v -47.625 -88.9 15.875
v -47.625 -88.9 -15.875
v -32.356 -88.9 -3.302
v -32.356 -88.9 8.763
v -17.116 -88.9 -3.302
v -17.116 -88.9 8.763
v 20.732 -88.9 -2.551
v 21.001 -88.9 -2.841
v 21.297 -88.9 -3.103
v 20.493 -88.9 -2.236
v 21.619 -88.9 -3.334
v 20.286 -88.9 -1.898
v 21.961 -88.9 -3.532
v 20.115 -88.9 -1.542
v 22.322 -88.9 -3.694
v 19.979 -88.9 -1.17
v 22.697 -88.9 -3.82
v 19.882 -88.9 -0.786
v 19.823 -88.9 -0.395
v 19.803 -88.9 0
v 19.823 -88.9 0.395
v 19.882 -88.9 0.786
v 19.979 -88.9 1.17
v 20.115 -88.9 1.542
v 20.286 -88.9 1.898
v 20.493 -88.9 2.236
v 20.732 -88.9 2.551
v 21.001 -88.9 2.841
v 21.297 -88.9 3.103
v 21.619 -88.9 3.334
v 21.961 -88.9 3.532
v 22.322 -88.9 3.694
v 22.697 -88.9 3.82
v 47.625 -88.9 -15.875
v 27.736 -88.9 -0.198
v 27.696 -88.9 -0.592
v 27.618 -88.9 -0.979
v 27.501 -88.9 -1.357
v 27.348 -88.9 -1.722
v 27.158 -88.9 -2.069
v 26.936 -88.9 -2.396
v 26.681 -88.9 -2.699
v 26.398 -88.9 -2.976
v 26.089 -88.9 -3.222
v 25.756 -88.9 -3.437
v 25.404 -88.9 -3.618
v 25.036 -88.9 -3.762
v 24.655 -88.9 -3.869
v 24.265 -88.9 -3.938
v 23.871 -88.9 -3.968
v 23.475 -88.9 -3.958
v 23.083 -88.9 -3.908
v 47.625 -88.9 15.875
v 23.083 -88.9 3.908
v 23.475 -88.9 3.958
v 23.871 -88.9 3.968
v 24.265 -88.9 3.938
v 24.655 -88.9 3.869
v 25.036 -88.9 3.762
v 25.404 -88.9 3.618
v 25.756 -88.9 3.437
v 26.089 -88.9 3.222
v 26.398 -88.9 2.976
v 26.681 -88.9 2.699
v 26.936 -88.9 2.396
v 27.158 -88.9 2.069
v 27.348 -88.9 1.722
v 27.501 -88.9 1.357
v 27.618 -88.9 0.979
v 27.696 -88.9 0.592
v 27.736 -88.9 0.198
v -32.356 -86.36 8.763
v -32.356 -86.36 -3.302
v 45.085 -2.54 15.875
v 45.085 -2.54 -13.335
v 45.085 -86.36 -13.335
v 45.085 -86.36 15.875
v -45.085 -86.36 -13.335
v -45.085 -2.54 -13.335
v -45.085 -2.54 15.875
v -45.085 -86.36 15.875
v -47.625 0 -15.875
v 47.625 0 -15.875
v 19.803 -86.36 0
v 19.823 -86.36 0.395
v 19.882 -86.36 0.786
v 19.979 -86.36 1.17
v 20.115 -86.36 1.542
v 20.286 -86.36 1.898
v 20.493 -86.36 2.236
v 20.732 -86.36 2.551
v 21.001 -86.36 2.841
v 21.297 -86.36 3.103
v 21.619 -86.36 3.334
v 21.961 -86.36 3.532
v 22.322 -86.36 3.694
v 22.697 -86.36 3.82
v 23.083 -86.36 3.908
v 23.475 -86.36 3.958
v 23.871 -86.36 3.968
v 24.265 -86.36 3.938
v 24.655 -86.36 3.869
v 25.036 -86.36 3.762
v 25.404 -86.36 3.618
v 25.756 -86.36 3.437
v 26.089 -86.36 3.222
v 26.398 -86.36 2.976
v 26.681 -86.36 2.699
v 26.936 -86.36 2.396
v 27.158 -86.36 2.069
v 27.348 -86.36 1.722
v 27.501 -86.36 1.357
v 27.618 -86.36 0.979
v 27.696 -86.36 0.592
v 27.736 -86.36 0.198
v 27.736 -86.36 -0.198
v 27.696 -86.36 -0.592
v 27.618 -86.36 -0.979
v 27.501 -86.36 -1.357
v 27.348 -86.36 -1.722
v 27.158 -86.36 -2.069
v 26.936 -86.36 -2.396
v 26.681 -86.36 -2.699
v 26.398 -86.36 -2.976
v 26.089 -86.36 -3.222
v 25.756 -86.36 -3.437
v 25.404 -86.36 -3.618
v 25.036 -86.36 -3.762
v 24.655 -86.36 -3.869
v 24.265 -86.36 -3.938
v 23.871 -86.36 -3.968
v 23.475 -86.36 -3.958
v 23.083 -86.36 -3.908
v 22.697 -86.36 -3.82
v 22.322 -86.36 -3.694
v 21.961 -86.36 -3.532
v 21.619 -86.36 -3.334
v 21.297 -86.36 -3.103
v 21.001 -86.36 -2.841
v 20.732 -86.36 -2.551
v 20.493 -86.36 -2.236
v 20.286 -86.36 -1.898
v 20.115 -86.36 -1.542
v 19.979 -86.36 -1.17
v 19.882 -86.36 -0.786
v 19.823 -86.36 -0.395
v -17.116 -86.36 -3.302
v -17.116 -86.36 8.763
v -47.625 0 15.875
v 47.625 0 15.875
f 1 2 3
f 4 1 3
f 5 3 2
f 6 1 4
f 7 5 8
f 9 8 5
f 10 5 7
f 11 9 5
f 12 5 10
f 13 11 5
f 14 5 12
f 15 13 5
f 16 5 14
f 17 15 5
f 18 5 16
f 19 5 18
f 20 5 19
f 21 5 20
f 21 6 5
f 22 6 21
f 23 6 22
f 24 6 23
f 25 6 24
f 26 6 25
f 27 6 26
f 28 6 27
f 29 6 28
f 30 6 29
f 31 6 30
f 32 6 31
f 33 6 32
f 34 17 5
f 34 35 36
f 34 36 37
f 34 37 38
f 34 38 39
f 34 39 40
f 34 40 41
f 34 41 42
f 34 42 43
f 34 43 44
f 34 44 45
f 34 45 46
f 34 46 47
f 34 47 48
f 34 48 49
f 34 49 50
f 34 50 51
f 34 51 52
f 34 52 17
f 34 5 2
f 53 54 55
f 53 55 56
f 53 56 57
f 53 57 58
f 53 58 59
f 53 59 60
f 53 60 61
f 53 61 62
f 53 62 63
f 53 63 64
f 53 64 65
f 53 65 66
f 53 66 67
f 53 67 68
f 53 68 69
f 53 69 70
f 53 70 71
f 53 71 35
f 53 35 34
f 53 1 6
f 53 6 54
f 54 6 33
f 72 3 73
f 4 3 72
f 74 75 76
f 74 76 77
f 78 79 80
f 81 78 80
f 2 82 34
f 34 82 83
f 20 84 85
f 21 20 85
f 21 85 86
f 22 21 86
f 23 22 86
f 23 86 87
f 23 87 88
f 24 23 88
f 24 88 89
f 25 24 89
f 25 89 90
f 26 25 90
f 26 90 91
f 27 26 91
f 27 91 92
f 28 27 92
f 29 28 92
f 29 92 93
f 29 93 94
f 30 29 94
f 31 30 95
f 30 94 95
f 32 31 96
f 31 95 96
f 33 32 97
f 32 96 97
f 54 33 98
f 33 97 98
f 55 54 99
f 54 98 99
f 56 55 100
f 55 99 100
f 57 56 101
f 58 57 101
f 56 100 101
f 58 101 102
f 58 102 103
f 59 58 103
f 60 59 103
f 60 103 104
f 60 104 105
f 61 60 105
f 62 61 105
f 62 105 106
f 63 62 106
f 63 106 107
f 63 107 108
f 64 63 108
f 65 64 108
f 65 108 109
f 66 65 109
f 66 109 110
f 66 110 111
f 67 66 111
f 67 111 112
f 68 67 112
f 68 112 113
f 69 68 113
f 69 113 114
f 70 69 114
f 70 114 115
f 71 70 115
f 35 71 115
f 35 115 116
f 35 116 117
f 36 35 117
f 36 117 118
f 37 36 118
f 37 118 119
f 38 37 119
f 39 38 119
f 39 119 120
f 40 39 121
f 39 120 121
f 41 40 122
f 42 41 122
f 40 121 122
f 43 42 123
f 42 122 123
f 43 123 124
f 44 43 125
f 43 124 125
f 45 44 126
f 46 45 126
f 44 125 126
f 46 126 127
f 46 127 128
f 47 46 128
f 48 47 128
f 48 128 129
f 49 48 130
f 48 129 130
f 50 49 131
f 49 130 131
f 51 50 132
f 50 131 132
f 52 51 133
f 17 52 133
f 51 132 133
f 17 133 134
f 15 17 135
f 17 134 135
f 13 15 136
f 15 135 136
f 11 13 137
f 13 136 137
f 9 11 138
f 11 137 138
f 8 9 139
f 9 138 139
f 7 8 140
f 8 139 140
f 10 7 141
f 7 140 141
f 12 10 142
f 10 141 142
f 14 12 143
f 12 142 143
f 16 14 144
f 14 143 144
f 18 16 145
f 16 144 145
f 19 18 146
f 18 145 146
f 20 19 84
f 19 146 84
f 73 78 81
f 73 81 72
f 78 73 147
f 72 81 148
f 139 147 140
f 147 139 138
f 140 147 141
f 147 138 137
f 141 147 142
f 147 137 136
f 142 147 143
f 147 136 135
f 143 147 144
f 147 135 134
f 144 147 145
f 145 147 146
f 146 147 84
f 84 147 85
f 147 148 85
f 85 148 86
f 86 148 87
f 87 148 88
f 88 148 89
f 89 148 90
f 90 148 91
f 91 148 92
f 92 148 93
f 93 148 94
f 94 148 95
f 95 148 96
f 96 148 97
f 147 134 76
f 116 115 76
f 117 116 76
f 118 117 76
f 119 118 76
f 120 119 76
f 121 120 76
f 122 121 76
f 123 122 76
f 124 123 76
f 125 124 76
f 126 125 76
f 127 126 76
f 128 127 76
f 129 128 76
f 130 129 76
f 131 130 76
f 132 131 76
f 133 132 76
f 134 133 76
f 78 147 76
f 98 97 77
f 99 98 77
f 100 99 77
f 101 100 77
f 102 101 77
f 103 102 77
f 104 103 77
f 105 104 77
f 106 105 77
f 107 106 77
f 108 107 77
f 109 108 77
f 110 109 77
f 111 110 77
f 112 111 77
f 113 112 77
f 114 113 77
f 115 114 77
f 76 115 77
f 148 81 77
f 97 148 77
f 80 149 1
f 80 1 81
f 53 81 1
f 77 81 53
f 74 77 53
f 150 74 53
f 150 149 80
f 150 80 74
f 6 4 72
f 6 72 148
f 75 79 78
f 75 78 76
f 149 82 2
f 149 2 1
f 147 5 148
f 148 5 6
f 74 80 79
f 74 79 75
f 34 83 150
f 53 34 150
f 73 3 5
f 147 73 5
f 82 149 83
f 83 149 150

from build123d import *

# Parameters (mm, degrees)
F0_W     = 95.25
F0_H     = 31.75
F1_DEPTH = 88.9
F2_T     = -2.54
F4_D     = 7.9375
F4_DEPTH = 12.7
F5_W     = 15.24
F5_H     = 12.065
F6_DEPTH = 2.54


with BuildPart() as f1:
    # F0 (on Front) → F1 (new body)
    with BuildSketch(Plane.XZ):
        Rectangle(F0_W, F0_H)
    extrude(amount=F1_DEPTH)

    # F2
    f2_openings = [f1.faces().sort_by_distance(p)[0] for p in [
        (0, -44.45, 15.875),
    ]]
    offset(amount=F2_T, openings=f2_openings)

    # F4
    with Locations(Plane.XZ.offset(88.9)):
        with Locations((23.771884, 0)):
            Hole(F4_D / 2, depth=F4_DEPTH)

    # F5 (on face) → F6 (cut, through all)
    with BuildSketch(Plane.XZ.offset(88.9)):
        with Locations((-24.736177, 2.730849)):
            Rectangle(F5_W, F5_H)
    extrude(amount=-F6_DEPTH, mode=Mode.SUBTRACT)


solid = f1.part
